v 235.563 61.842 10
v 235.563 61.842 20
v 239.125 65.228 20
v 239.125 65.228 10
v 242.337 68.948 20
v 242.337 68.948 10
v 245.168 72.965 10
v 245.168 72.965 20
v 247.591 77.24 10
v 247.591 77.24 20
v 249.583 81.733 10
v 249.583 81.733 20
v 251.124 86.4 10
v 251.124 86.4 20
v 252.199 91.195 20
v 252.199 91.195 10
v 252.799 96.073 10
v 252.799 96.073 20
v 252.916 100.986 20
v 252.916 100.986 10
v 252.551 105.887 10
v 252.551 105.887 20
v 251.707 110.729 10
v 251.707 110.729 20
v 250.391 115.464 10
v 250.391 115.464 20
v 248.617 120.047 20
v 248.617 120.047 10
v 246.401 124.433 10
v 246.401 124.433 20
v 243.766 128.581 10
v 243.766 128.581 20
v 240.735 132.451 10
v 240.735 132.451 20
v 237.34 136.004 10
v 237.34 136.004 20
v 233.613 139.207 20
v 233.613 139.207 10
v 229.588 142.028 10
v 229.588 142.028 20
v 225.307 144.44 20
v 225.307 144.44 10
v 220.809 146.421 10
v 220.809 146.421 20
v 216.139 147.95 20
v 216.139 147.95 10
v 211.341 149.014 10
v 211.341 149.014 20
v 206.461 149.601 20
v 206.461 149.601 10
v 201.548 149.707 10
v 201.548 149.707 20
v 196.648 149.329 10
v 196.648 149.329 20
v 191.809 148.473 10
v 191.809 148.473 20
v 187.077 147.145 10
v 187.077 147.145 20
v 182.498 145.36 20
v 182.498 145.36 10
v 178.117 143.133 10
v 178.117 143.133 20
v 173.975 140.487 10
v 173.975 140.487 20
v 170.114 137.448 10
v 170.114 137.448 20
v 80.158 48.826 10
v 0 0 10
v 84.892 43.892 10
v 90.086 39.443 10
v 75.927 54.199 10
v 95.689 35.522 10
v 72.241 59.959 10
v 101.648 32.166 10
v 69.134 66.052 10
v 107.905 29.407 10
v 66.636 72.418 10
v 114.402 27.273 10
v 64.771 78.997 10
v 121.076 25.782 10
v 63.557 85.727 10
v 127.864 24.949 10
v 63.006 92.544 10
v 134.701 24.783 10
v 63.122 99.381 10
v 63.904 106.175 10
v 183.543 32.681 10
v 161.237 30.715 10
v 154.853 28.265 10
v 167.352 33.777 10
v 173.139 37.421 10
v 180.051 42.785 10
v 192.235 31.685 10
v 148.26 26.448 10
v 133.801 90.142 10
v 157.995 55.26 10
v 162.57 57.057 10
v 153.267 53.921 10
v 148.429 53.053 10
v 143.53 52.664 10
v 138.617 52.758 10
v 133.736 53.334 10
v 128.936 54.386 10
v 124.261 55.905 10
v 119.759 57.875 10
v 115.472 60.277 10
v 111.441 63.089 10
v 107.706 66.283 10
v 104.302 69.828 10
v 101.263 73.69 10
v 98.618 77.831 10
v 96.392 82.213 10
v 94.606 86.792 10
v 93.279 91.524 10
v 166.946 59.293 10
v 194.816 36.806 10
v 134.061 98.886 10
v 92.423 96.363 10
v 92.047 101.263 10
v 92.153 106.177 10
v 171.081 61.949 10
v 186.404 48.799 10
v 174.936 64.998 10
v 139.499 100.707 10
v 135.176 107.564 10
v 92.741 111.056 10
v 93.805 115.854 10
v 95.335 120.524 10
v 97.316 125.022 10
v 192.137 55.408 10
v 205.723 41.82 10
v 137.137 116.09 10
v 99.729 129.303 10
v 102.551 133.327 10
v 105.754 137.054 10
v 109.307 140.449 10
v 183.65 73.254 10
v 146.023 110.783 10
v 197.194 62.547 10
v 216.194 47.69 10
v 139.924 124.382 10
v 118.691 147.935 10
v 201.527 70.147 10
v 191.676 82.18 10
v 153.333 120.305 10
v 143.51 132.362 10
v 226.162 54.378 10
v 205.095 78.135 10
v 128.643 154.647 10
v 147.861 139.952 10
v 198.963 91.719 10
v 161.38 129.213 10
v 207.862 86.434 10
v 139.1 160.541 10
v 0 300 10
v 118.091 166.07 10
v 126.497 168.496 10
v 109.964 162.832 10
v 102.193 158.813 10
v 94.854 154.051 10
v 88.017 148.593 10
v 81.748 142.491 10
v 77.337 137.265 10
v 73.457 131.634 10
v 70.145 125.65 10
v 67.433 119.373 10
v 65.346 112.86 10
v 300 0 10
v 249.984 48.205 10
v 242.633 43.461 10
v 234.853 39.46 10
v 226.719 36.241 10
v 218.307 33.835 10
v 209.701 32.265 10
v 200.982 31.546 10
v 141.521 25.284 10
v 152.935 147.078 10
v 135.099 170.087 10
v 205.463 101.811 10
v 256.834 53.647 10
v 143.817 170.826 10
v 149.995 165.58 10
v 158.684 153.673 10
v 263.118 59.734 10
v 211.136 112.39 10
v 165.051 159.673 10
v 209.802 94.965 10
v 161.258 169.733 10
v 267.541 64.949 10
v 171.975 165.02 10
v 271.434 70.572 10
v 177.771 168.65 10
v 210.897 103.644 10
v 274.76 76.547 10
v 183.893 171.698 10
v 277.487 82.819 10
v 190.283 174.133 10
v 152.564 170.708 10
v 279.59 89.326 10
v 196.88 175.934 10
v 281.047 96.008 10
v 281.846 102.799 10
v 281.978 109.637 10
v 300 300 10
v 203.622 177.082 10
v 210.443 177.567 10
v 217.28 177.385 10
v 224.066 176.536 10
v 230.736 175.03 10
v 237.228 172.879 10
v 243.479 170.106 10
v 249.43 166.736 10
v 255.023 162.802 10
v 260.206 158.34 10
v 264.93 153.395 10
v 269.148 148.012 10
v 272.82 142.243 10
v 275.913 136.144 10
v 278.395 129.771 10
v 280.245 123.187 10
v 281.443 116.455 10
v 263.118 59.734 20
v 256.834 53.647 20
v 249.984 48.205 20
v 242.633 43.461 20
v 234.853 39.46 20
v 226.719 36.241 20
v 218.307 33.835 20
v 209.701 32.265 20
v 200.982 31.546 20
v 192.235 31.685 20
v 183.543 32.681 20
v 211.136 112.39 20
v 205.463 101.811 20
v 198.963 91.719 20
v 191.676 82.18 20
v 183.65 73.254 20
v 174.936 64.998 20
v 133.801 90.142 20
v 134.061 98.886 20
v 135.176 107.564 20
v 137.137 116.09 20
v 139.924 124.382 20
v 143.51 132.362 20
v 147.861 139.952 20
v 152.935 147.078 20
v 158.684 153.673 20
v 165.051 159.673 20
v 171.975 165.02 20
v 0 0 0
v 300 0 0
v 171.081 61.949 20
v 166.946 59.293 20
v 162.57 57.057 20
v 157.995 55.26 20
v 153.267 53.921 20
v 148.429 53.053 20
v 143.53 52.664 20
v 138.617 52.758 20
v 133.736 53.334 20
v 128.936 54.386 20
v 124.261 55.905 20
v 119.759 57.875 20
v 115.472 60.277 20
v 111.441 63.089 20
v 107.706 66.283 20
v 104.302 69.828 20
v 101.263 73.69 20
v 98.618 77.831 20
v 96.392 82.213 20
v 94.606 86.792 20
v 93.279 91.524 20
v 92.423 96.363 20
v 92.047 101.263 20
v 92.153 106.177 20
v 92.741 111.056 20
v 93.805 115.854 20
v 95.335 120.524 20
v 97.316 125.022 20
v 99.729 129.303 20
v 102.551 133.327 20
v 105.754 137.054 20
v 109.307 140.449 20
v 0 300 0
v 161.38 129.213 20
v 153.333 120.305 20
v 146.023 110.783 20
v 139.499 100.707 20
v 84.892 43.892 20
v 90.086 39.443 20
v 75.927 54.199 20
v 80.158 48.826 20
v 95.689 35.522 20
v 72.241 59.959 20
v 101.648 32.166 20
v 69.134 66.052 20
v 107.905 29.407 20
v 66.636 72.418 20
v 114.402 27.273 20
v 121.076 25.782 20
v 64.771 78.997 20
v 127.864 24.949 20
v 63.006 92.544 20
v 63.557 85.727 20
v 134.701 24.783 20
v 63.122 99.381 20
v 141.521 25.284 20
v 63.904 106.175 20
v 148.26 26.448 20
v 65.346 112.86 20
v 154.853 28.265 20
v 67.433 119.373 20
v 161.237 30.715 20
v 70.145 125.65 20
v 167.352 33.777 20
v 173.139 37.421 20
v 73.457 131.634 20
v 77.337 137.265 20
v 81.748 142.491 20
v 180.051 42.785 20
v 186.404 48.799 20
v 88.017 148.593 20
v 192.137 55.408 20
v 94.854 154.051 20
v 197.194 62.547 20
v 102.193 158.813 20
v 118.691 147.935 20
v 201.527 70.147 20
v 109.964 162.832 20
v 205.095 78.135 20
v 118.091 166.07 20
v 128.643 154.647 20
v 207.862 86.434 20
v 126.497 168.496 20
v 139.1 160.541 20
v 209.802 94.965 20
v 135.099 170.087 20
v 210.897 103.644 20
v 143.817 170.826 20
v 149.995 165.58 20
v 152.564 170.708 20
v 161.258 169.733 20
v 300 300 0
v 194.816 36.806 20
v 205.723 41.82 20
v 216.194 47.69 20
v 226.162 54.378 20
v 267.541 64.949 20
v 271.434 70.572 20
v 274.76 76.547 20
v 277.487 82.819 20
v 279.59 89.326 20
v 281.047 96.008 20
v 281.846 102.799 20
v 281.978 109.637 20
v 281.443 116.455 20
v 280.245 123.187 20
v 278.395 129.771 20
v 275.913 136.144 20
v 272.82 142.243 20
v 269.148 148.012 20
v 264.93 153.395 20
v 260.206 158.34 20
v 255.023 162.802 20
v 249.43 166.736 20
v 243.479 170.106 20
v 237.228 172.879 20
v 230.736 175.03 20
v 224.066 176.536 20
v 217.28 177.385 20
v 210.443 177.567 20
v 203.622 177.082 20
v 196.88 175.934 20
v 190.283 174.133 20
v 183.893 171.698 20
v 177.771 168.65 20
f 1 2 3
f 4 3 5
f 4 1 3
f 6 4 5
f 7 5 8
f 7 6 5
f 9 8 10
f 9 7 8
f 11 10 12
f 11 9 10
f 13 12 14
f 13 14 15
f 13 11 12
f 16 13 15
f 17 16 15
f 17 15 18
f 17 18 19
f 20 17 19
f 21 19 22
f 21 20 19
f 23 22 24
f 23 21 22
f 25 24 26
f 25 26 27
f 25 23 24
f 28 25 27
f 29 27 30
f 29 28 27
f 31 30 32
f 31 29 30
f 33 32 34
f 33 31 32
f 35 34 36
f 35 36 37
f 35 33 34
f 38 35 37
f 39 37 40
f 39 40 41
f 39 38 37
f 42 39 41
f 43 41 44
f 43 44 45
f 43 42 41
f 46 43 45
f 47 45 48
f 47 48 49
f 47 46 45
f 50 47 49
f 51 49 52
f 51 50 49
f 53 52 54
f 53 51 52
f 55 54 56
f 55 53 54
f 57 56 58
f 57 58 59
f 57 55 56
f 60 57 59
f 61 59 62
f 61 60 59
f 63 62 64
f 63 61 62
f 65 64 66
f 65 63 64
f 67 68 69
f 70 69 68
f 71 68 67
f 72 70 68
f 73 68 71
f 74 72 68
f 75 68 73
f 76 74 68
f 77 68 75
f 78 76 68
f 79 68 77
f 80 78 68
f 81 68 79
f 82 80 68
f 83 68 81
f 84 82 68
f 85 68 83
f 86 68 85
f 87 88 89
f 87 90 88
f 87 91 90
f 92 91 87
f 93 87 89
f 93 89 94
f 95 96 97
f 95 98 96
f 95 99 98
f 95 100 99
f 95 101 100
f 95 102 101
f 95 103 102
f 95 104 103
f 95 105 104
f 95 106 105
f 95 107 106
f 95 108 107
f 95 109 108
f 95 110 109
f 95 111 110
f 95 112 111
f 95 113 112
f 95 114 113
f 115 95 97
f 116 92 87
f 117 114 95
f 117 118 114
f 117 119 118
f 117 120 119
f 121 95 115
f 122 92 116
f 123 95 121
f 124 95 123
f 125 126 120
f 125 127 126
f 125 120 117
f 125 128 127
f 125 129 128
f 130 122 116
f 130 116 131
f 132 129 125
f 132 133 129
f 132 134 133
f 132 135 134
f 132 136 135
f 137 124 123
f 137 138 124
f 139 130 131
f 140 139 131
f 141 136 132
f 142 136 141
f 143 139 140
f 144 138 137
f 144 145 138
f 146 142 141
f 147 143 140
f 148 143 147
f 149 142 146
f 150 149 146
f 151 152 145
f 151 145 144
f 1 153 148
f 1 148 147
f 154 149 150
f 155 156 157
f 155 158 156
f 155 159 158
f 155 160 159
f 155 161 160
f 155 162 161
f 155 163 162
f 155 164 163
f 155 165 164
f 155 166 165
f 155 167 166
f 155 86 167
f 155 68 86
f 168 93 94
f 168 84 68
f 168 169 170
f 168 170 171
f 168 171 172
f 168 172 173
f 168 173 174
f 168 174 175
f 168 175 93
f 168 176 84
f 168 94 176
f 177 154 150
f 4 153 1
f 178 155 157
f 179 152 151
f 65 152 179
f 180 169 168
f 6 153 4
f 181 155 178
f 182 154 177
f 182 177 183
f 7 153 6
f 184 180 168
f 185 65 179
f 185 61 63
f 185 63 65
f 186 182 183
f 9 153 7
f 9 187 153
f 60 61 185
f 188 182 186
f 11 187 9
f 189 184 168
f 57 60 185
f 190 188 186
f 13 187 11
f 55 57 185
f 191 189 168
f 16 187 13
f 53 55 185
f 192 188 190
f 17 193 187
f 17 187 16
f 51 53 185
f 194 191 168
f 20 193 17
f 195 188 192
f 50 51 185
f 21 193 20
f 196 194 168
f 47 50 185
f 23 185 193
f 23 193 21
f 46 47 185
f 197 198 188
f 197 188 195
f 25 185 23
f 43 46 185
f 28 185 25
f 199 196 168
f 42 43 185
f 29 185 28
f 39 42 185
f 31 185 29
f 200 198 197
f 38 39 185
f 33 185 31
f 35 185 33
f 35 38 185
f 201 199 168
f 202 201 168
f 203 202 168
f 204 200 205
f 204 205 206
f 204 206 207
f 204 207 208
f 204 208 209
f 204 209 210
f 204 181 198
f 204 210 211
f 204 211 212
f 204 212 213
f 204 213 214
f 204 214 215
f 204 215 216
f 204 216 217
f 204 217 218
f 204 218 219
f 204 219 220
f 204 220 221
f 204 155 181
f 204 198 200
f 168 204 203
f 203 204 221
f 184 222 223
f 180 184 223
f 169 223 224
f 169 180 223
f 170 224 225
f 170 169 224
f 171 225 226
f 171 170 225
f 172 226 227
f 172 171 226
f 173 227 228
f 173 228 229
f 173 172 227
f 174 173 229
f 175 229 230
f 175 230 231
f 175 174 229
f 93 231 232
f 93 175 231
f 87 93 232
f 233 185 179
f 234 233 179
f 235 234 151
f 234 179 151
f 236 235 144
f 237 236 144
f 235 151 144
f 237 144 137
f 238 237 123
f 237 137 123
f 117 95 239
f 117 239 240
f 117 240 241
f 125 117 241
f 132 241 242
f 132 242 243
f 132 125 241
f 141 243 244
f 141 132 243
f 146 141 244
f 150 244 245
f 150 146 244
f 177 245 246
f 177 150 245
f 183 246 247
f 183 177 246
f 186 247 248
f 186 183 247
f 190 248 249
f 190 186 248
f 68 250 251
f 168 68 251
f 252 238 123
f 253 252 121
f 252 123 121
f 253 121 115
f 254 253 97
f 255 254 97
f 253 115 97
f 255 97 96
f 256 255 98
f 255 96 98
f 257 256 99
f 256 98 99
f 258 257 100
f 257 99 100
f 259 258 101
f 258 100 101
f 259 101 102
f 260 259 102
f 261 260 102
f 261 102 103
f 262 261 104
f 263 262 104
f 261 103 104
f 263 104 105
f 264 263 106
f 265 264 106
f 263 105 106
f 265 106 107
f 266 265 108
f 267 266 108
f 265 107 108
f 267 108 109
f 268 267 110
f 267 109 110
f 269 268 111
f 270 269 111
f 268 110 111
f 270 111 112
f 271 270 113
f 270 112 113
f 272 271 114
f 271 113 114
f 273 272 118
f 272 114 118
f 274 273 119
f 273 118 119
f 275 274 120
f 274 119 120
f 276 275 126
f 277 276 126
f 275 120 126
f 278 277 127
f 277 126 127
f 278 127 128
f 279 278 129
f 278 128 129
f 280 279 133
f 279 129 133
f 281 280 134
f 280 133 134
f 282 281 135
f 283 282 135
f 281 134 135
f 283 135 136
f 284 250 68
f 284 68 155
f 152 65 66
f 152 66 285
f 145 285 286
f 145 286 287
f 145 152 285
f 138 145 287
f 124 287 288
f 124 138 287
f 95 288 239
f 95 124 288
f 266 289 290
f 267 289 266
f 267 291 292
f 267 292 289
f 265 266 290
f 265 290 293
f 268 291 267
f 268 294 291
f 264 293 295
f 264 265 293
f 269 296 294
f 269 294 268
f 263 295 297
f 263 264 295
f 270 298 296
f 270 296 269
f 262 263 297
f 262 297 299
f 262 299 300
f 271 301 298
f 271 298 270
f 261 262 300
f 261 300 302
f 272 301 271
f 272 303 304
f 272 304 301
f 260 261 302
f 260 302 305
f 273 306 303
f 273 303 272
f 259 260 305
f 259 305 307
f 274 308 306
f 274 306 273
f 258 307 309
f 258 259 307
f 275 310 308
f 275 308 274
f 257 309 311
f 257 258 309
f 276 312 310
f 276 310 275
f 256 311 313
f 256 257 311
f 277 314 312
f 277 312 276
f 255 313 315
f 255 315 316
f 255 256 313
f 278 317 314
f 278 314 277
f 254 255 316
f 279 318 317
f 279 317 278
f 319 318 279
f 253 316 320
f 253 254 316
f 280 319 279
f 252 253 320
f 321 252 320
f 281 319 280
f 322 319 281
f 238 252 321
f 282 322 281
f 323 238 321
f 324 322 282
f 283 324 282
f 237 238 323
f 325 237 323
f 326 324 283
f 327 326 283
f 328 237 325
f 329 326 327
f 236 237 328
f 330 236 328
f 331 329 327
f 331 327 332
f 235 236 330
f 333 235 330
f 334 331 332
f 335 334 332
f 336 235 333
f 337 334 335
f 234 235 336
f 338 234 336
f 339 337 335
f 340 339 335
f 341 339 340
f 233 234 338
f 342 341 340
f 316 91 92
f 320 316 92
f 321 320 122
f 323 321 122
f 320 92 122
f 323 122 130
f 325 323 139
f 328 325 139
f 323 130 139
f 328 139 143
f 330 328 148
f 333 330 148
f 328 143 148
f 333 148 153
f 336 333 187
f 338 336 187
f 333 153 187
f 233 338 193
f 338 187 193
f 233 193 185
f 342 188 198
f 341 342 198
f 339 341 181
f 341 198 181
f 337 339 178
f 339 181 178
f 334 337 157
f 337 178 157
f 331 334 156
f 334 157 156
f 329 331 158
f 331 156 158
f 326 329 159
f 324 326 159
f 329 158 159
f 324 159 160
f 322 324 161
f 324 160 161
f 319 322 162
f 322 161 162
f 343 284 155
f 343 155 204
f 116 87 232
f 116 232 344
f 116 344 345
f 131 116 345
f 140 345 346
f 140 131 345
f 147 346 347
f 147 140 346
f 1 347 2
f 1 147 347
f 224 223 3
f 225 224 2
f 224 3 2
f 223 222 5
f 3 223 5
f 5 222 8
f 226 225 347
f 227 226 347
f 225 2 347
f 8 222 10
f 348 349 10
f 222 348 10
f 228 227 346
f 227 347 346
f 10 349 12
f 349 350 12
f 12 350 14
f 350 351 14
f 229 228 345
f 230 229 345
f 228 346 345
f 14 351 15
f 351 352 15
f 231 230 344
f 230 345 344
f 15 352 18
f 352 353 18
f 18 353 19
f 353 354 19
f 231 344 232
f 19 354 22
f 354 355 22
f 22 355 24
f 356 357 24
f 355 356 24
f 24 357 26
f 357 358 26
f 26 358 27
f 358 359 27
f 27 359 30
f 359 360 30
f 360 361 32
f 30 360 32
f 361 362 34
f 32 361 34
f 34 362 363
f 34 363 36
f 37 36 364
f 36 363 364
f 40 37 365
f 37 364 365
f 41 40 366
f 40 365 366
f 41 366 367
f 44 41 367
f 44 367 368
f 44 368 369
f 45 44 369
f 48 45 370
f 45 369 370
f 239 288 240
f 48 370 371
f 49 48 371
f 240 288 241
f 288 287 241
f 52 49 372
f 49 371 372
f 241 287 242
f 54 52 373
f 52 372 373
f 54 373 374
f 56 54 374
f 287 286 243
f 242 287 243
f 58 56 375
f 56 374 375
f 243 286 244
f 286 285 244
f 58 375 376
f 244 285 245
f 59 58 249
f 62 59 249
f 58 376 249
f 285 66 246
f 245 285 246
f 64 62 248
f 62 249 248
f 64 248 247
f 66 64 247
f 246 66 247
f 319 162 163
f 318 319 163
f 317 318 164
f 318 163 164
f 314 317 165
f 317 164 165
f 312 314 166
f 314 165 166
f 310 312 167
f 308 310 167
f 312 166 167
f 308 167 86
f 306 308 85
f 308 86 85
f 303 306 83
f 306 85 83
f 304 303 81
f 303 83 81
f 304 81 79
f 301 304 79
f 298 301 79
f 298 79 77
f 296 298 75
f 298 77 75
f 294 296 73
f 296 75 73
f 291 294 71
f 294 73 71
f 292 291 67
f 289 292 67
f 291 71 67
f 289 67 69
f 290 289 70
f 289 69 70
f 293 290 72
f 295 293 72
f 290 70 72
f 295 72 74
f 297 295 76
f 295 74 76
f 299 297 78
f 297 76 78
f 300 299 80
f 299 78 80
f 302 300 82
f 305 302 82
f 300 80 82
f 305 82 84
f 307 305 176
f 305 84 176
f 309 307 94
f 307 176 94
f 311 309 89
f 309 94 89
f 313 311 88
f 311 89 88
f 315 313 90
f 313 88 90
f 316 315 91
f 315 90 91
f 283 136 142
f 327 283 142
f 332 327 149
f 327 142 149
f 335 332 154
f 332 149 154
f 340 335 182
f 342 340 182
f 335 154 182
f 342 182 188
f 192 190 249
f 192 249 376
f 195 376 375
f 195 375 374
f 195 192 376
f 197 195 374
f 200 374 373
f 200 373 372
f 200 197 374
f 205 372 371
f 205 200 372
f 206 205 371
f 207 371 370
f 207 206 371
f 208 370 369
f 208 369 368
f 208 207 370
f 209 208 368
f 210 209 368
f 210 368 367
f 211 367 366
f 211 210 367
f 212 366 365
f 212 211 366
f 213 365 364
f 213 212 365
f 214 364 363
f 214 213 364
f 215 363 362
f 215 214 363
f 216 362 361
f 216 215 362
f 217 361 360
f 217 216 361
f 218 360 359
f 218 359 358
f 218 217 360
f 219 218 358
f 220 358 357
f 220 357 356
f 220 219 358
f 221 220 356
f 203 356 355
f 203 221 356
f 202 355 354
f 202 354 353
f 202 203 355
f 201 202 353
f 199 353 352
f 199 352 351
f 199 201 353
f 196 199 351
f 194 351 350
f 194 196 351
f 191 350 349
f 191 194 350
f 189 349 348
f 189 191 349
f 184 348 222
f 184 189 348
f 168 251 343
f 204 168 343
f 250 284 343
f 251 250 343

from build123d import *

# Parameters (mm, degrees)
SKICA1_W                = 300
SKICA1_H                = 300
P_IDAT_VYSUNUT_M1_DEPTH = 10
P_IDAT_VYSUNUT_M3_DEPTH = 10


with BuildPart() as part:
    # Skica1 → Přidat vysunutím1 (new body)
    with BuildSketch(Plane.XY):
        with Locations((150, 150)):
            Rectangle(SKICA1_W, SKICA1_H)
    extrude(amount=P_IDAT_VYSUNUT_M1_DEPTH)

    # Skica3 → Přidat vysunutím3 (add)
    with BuildSketch(Plane.XY.offset(10)):
        with BuildLine():
            ThreePointArc((161.258214426, 169.732529164), (118.091173044, 166.070333412), (81.747818606, 142.491407915))
            ThreePointArc((81.747818606, 142.491407915), (80.157704047, 48.826419384), (173.139331363, 37.421353736))
            ThreePointArc((173.139331363, 37.421353736), (201.527121298, 70.146550787), (211.135953458, 112.38960328))
            ThreePointArc((211.135953458, 112.38960328), (195.41469161, 86.876535147), (174.935524438, 64.997814169))
            ThreePointArc((174.935524438, 64.997814169), (104.302093893, 69.827572661), (109.307122532, 140.448800107))
            ThreePointArc((109.307122532, 140.448800107), (133.812696433, 157.698483219), (161.258214426, 169.732529164))
        make_face()
        with BuildLine():
            ThreePointArc((263.117659489, 59.733740684), (226.718588511, 36.240916857), (183.542998572, 32.680920678))
            ThreePointArc((183.542998572, 32.680920678), (211.01692785, 44.649961145), (235.56326825, 61.841583891))
            ThreePointArc((235.56326825, 61.841583891), (240.735464455, 132.450765052), (170.113665313, 137.447720489))
            ThreePointArc((170.113665313, 137.447720489), (149.582762041, 115.617541137), (133.801147174, 90.141761426))
            ThreePointArc((133.801147174, 90.141761426), (143.509954364, 132.361948569), (171.975135093, 165.019851524))
            ThreePointArc((171.975135093, 165.019851524), (264.929502664, 153.394702482), (263.117659489, 59.733740684))
        make_face()
    extrude(amount=P_IDAT_VYSUNUT_M3_DEPTH)


solid = part.part
